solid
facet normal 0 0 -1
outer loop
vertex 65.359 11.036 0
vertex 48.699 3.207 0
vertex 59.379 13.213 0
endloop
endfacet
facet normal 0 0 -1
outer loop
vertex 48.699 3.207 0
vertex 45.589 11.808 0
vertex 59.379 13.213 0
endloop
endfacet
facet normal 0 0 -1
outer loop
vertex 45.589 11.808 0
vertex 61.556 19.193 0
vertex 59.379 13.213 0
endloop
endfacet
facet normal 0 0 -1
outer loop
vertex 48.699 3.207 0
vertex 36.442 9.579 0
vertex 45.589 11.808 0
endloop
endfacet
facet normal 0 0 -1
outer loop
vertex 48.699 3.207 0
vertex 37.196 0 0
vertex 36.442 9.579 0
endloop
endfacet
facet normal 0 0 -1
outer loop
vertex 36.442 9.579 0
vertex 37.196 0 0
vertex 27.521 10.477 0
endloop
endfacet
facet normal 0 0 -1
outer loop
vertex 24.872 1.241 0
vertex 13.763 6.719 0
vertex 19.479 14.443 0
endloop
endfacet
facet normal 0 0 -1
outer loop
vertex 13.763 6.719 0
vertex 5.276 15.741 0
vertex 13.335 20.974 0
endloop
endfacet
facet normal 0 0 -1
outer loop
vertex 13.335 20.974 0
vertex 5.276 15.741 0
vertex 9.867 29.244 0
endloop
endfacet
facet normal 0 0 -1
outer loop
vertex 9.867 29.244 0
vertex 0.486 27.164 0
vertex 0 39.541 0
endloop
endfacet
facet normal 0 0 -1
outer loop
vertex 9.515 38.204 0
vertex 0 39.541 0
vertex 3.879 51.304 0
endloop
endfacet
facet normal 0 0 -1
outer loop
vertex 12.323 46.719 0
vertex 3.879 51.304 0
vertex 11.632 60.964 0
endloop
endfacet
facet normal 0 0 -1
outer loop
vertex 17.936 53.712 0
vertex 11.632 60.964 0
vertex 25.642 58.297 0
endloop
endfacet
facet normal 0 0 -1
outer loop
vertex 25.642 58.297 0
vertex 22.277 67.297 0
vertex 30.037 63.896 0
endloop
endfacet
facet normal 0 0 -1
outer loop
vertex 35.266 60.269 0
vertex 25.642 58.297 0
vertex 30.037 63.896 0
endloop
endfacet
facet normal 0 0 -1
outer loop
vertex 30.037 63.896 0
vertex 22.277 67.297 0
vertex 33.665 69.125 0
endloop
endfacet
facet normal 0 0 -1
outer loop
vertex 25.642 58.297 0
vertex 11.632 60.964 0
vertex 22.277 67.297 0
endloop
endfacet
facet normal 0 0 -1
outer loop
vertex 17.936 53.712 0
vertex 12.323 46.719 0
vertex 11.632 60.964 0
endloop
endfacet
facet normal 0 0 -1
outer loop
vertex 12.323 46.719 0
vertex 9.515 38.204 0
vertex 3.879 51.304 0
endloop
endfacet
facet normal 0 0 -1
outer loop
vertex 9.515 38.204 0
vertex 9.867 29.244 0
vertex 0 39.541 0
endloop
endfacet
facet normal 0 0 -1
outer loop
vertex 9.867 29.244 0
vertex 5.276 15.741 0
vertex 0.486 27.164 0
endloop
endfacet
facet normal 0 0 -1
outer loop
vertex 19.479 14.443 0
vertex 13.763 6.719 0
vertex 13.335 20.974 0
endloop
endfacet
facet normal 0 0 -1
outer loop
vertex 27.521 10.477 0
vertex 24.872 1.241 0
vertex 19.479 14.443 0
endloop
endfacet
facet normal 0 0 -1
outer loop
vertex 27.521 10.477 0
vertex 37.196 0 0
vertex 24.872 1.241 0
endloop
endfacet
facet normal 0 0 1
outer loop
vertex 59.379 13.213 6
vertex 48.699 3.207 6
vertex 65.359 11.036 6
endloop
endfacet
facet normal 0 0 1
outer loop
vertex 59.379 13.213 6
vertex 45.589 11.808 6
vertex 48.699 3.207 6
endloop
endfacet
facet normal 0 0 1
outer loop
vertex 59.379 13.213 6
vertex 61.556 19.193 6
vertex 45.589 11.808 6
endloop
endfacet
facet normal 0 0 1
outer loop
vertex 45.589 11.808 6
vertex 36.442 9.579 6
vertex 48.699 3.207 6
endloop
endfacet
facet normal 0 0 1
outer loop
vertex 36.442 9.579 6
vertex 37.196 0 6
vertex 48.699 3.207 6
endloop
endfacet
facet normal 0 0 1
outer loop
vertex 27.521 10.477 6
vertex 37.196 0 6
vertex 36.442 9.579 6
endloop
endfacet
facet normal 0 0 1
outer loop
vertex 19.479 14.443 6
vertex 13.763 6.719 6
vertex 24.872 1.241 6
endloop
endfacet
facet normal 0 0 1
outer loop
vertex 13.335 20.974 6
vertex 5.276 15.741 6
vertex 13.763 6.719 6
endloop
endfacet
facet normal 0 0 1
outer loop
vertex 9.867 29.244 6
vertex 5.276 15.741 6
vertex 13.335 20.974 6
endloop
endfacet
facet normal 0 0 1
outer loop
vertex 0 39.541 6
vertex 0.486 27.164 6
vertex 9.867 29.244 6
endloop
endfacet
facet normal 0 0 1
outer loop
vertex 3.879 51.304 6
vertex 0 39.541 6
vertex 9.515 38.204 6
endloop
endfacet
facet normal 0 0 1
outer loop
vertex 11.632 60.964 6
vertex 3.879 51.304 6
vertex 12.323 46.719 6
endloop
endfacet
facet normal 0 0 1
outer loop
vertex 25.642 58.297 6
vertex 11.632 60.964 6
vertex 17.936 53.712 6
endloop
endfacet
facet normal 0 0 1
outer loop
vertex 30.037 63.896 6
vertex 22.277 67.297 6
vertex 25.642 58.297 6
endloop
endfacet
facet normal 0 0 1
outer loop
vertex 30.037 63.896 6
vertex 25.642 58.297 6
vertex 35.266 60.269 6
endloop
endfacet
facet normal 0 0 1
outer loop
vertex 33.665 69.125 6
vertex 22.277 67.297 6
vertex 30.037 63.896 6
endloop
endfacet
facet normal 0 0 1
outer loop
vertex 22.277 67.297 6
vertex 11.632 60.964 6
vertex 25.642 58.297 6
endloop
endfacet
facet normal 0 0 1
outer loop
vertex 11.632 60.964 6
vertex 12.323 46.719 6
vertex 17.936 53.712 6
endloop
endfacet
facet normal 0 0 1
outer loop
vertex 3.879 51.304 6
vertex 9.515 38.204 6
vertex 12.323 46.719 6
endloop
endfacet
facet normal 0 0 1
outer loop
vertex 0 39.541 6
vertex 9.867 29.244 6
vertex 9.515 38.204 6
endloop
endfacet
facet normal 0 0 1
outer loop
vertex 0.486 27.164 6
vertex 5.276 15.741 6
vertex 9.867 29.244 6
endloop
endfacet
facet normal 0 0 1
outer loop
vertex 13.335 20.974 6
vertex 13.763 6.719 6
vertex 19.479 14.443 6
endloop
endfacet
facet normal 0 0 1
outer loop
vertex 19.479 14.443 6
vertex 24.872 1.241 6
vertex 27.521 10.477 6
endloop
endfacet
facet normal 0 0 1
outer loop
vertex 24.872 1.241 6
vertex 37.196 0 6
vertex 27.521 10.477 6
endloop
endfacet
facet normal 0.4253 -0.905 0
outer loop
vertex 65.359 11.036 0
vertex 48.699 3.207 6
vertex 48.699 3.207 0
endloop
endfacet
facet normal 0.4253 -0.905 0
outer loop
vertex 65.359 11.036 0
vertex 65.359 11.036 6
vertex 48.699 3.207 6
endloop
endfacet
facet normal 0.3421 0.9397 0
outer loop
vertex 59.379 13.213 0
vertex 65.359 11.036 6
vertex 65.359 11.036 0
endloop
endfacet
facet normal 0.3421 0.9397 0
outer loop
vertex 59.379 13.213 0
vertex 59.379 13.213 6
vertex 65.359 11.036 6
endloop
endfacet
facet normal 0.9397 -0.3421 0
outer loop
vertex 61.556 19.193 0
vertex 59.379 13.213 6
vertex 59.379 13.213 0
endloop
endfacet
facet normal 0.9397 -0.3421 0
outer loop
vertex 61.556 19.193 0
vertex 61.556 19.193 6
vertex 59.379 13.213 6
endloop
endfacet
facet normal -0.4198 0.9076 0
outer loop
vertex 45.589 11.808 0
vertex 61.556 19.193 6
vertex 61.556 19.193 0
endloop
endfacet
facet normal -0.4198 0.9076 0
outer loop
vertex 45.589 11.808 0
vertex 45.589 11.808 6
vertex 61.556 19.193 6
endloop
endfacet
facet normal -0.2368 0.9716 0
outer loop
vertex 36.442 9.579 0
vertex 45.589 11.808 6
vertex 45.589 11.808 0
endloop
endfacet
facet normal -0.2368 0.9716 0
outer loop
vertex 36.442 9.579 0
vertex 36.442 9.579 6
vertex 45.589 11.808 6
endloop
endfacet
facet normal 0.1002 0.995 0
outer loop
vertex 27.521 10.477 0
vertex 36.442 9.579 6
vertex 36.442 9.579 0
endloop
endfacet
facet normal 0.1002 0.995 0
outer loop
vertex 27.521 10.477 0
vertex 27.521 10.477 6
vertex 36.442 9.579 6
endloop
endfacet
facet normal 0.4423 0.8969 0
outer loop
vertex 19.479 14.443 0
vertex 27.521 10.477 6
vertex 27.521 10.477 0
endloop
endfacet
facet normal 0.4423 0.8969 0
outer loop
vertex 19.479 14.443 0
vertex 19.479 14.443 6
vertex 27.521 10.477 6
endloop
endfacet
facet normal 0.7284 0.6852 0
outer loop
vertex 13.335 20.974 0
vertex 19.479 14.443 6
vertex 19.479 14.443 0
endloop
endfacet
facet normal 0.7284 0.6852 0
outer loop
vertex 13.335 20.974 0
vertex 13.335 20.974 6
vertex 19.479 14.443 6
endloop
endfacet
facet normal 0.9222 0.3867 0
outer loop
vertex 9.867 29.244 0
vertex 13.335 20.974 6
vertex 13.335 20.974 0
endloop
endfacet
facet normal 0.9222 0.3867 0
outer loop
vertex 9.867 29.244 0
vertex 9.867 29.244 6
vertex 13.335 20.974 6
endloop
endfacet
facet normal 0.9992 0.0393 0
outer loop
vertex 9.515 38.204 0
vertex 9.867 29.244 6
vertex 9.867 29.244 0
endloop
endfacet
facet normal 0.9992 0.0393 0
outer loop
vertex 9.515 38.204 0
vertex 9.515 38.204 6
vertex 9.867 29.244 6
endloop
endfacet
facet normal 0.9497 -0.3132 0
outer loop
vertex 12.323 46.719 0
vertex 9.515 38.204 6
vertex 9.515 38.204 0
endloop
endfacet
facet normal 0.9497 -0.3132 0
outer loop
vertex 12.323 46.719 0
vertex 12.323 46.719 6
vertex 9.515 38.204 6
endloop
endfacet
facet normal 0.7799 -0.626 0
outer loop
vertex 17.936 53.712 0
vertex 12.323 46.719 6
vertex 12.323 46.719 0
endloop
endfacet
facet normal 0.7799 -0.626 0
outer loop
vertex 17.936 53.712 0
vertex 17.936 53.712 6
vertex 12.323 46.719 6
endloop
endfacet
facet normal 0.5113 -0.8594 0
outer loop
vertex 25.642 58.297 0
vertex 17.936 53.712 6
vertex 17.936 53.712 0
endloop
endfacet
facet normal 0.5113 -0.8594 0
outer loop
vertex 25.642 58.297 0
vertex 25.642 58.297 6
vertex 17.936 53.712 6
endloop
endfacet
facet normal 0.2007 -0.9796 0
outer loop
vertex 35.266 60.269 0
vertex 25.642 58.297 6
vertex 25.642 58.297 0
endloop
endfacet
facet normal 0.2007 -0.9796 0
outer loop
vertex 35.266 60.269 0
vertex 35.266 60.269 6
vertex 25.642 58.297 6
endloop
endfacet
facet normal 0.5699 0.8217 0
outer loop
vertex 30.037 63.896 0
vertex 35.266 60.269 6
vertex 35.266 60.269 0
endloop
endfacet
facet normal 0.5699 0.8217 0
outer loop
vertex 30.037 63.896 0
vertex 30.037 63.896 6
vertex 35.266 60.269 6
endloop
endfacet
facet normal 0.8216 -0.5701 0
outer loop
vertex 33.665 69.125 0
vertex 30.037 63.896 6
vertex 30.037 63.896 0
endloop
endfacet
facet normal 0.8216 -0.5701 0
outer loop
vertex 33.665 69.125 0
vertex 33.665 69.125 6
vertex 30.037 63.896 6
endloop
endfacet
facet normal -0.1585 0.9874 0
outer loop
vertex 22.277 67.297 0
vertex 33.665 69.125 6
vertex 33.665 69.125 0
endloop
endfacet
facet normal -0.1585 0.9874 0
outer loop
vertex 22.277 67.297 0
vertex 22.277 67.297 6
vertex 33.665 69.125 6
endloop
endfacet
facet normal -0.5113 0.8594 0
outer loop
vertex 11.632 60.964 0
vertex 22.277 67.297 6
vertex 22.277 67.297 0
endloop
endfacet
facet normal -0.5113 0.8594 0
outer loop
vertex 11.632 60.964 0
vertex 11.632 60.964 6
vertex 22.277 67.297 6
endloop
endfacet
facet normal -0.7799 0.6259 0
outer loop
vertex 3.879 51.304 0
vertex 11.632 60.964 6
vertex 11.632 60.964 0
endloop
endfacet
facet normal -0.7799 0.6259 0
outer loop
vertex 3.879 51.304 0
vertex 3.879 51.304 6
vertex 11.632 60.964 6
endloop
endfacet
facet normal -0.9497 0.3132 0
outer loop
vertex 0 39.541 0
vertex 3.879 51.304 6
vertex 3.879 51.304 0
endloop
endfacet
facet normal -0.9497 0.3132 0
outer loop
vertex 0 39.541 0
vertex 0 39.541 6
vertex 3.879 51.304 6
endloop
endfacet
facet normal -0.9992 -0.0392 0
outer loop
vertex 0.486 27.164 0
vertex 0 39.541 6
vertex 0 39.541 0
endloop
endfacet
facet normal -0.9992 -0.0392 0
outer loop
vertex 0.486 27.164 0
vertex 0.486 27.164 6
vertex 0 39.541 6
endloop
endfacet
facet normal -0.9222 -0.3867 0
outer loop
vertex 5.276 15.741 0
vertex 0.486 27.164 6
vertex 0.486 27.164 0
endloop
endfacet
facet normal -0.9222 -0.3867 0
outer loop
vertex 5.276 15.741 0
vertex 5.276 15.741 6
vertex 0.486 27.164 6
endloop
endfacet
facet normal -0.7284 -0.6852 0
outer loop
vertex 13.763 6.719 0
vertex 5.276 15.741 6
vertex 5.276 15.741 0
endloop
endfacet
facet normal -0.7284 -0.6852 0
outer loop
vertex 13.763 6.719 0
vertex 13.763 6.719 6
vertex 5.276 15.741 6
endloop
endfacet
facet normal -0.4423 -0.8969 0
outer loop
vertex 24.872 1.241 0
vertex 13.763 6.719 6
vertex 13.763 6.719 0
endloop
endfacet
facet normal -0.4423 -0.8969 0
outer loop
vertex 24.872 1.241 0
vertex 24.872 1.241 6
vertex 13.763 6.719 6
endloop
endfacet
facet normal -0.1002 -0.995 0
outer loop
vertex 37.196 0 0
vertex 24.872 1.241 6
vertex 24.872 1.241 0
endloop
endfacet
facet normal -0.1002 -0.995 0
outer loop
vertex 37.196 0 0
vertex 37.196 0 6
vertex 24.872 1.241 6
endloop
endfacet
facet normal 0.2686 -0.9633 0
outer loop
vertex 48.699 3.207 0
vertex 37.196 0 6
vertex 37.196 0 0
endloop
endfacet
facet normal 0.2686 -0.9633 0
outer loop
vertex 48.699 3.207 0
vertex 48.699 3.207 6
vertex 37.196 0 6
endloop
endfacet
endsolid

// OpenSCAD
$fn = 32;

// ----------------------------------------------------------------------
// Hook plate: curl radius 30 mm over 205 degrees, 9 mm thick band
// ----------------------------------------------------------------------

// --- parameters (mm) ---
profile_height = 6;       // extrusion height
profile_points = 26;      // points of the closed outline

profile = [[30.037, 63.896], [33.665, 69.125], [22.277, 67.297], [11.632, 60.964], [3.879, 51.304], [0, 39.541], [0.486, 27.164], [5.276, 15.741], [13.763, 6.719], [24.872, 1.241], [37.196, 0], [48.699, 3.207], [65.359, 11.036], [59.379, 13.213], [61.556, 19.193], [45.589, 11.808], [36.442, 9.579], [27.521, 10.477], [19.479, 14.443], [13.335, 20.974], [9.867, 29.244], [9.515, 38.204], [12.323, 46.719], [17.936, 53.712], [25.642, 58.297], [35.266, 60.269]];  // single closed polygon, 26 points, counter clockwise

// --- the one profile operation ---
linear_extrude(height = profile_height) polygon(points = profile);
